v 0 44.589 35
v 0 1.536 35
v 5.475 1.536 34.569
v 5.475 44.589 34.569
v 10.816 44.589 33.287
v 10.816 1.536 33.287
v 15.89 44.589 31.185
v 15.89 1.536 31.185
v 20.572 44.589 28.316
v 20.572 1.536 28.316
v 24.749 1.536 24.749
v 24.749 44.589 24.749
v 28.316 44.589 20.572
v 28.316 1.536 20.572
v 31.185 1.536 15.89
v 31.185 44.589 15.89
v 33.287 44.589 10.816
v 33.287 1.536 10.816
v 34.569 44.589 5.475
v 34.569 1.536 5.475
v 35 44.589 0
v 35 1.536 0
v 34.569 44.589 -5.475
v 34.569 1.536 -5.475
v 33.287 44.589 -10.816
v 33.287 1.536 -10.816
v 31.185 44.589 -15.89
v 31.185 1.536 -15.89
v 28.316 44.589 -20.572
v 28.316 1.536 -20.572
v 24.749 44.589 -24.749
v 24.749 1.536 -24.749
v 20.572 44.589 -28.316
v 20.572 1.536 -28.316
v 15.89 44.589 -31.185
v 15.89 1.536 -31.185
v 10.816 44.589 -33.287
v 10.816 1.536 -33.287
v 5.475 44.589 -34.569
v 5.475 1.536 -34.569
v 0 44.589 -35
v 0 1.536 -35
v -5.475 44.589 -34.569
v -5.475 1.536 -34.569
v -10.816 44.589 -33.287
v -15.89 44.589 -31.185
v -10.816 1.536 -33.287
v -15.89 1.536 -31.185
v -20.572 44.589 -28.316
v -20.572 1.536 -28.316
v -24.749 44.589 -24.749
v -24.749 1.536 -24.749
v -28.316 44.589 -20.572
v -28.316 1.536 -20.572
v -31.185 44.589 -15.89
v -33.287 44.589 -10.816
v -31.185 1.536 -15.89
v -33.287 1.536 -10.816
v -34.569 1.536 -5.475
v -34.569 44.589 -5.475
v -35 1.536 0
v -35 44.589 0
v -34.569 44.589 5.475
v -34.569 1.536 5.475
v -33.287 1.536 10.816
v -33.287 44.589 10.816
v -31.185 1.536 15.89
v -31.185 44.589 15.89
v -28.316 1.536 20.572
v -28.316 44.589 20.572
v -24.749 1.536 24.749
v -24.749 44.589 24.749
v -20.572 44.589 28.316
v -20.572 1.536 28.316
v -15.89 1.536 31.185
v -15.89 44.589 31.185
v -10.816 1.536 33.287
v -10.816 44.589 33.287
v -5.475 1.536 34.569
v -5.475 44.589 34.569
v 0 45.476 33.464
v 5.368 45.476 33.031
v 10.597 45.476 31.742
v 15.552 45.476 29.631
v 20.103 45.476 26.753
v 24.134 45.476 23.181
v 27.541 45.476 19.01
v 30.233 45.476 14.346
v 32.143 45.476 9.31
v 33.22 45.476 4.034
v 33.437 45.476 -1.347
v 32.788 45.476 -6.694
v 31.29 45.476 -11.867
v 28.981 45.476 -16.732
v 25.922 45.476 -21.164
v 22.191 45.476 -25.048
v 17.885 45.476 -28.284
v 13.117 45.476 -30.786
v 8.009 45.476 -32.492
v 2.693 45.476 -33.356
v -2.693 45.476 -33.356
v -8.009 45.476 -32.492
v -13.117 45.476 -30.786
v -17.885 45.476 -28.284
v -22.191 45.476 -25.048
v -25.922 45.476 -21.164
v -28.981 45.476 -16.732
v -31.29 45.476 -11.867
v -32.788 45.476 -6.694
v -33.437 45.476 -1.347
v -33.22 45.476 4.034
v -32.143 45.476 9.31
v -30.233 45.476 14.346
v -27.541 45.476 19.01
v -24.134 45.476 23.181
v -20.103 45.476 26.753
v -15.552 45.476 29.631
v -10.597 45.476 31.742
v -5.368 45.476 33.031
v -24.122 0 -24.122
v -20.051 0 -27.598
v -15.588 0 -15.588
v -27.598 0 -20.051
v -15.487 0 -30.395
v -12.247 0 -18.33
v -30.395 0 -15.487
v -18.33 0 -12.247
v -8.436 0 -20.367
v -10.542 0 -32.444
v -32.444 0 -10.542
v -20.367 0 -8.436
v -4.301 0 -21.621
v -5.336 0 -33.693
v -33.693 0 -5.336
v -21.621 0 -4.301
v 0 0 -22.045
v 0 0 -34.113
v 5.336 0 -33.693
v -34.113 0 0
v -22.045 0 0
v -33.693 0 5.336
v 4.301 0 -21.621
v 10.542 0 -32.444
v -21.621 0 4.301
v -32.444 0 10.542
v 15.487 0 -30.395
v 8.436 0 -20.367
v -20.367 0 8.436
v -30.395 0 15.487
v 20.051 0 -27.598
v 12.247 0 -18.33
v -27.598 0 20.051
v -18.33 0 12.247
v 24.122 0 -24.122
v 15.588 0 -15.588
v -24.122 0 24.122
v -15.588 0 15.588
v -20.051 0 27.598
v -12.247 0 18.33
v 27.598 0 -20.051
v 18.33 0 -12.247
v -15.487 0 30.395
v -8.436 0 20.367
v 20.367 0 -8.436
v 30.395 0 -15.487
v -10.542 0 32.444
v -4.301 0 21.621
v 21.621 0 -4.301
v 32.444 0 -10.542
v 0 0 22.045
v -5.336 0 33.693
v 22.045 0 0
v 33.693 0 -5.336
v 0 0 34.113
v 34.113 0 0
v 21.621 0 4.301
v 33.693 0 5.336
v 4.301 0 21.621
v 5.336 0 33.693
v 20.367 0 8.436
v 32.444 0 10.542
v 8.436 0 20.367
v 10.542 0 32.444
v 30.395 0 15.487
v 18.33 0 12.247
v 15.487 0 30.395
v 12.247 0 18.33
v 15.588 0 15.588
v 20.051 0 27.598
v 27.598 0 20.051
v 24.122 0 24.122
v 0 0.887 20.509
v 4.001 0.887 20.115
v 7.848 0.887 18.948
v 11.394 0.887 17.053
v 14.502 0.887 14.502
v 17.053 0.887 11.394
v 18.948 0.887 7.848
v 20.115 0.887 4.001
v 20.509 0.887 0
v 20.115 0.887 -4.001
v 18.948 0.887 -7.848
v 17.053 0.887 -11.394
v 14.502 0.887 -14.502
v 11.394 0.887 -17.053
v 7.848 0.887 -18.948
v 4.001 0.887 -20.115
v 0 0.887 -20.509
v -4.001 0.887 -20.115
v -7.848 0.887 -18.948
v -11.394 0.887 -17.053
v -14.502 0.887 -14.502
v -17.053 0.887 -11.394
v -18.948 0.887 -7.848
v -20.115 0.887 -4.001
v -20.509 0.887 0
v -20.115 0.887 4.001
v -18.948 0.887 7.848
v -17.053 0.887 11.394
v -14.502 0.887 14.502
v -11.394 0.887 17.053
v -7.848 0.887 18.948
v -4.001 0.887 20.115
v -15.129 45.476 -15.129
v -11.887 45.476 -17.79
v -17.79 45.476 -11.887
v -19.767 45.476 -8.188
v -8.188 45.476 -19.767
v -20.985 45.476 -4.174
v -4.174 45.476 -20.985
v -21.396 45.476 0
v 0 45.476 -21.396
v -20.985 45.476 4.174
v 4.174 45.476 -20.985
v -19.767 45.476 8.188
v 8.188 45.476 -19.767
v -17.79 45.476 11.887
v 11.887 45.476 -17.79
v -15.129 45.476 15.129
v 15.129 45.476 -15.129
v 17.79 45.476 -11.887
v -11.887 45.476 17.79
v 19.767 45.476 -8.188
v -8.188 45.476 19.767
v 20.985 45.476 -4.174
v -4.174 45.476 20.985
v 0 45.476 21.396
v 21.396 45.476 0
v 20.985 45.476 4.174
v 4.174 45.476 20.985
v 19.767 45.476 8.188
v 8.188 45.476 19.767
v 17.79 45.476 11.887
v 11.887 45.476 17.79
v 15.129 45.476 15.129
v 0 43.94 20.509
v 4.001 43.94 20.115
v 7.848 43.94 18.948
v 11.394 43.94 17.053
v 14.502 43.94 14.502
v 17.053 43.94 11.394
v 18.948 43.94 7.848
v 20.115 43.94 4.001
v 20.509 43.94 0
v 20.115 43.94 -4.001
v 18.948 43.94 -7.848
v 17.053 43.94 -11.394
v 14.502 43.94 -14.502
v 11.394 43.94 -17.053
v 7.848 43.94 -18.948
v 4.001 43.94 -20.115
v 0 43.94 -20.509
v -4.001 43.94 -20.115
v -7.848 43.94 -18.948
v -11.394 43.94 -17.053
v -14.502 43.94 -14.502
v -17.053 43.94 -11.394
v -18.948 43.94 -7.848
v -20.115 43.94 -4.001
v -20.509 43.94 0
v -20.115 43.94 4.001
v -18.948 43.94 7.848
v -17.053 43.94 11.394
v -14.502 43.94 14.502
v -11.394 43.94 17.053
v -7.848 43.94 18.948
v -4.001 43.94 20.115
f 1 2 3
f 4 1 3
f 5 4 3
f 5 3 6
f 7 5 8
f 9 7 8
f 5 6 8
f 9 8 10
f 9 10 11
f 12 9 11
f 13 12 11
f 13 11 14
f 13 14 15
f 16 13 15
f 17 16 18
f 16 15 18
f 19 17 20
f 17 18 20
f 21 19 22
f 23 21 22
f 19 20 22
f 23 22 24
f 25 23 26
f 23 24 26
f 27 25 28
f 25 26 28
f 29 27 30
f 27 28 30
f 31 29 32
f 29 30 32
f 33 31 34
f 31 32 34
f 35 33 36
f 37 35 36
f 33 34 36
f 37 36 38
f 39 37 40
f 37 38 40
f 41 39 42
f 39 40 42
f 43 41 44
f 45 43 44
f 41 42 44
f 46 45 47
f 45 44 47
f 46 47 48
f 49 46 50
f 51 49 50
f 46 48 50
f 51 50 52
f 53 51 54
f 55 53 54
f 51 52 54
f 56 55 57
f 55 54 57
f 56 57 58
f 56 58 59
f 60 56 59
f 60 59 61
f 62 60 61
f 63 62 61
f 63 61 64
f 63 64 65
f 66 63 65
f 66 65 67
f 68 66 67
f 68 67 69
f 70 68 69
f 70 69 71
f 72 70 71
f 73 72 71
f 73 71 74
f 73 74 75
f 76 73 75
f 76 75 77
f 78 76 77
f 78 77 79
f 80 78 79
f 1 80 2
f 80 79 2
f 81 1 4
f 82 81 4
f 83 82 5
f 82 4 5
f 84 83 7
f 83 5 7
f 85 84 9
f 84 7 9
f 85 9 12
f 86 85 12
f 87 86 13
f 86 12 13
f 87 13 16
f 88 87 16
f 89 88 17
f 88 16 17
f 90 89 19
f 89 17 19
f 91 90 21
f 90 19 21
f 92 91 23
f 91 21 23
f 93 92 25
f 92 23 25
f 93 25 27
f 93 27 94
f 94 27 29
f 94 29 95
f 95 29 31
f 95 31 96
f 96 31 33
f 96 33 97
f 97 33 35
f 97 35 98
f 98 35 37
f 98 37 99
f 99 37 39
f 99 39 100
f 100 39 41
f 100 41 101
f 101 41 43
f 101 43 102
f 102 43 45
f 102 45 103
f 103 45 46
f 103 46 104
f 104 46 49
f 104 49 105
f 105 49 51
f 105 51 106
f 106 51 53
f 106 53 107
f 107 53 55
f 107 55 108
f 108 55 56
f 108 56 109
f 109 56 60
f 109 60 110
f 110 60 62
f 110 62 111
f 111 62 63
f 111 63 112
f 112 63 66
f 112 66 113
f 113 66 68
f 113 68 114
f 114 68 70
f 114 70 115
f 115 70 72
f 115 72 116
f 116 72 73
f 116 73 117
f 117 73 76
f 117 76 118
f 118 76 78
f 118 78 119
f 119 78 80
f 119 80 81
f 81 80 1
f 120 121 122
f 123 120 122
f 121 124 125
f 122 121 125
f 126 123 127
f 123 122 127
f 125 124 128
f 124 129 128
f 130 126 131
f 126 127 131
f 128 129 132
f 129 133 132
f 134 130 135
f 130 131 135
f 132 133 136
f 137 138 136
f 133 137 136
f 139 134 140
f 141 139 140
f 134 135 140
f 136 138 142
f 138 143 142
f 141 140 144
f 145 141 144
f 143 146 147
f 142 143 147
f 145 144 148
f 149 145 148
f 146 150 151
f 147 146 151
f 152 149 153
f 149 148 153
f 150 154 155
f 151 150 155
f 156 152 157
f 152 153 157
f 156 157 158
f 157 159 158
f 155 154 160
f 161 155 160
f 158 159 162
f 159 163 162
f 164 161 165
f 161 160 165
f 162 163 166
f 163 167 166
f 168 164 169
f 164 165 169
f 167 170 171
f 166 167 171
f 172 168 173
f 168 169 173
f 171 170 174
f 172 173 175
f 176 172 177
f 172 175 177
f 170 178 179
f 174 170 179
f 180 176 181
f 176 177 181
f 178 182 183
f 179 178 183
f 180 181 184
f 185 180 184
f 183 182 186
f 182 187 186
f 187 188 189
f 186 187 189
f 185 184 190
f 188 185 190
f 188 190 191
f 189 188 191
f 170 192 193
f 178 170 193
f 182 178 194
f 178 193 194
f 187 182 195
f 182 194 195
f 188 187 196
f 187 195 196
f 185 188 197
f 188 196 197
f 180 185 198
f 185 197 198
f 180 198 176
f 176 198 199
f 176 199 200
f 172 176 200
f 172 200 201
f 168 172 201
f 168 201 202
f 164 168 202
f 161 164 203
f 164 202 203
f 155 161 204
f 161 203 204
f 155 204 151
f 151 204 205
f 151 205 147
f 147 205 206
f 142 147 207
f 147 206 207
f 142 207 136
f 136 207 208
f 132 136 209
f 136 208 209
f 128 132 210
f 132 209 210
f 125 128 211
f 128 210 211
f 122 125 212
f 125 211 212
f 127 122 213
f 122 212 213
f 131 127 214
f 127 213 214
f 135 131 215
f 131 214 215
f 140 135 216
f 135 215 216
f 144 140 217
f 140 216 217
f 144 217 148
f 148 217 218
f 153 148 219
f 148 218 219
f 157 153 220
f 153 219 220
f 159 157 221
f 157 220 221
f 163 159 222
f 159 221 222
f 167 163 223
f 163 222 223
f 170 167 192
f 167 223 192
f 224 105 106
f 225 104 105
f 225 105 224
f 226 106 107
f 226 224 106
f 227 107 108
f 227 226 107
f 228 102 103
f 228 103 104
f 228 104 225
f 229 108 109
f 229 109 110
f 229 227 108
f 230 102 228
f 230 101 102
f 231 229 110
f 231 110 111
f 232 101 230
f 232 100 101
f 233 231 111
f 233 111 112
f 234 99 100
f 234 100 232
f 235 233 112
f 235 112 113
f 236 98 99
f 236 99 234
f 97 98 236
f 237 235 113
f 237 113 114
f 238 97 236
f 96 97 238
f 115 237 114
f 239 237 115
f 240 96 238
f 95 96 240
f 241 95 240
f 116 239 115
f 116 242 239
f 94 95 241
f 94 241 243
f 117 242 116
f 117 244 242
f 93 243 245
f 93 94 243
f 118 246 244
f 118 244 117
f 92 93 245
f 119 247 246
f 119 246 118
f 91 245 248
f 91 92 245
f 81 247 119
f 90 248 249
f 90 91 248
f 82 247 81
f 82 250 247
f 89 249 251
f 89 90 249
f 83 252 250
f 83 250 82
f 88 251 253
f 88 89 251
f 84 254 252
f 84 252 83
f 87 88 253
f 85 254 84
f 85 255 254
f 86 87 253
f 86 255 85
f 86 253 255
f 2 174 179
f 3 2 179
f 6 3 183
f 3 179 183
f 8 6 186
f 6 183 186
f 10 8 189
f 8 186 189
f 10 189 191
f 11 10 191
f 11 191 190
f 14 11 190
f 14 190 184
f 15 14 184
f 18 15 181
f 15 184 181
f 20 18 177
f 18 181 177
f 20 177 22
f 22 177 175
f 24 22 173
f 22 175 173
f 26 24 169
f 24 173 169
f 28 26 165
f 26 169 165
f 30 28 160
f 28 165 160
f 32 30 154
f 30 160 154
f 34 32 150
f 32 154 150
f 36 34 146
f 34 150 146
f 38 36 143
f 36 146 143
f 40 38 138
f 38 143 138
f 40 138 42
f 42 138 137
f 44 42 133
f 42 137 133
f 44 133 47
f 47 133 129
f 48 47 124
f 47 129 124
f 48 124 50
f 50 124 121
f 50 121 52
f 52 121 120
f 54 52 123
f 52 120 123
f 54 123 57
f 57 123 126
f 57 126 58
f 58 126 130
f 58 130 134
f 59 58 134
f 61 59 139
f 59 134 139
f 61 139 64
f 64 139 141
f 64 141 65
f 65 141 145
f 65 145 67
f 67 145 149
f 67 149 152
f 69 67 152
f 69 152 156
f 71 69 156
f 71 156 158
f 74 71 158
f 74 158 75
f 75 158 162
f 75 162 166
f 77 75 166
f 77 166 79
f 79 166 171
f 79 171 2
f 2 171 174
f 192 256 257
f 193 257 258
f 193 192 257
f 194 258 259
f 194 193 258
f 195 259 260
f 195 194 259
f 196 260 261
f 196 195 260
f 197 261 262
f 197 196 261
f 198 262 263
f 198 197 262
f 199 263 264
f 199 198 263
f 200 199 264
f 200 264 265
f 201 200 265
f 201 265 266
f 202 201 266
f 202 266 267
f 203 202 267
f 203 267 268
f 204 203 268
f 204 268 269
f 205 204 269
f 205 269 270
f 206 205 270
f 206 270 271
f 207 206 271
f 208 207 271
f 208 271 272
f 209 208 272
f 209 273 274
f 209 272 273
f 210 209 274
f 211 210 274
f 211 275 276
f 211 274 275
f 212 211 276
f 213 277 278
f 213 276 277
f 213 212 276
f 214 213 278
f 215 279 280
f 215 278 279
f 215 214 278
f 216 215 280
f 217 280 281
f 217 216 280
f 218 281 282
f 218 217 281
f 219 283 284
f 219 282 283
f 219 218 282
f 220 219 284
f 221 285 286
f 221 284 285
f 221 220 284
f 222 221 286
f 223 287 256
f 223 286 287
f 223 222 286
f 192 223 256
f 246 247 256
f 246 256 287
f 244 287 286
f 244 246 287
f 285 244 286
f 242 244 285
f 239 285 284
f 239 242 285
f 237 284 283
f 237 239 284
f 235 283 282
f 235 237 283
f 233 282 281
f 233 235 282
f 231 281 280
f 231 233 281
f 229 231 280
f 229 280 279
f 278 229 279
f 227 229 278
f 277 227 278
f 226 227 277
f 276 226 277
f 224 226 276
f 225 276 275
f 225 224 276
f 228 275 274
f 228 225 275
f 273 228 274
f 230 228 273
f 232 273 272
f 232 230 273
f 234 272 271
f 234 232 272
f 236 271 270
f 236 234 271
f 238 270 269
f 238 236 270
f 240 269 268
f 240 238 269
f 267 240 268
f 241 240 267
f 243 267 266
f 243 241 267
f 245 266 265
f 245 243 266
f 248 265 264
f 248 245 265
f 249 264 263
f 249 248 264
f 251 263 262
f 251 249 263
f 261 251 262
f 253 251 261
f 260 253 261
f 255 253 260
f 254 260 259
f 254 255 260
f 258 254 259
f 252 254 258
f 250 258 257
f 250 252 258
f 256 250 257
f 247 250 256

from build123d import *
from OCP.BRepFilletAPI import BRepFilletAPI_MakeChamfer

# Parameters (mm, degrees)
SKETCH1_R           = 35
BOSS_EXTRUDE1_DEPTH = 45.475969111
SKETCH2_R           = 20.508937662
CUT_EXTRUDE1_DEPTH  = 68.216543846
CHAMFER1_SIZE       = 0.886686517
CHAMFER1_SIZE2      = 1.535786098


with BuildPart() as part:
    # Sketch1 → Boss-Extrude1 (new body)
    with BuildSketch(Plane(origin=(0, 0, 0), x_dir=(1, 0, 0), z_dir=(0, 1, 0))):
        Circle(SKETCH1_R)
    extrude(amount=BOSS_EXTRUDE1_DEPTH)

    # Sketch2 → Cut-Extrude1 (cut, through all)
    with BuildSketch(Plane(origin=(0, 0, 0), x_dir=(1, 0, 0), z_dir=(0, 1, 0))):
        Circle(SKETCH2_R)
    extrude(amount=CUT_EXTRUDE1_DEPTH, mode=Mode.SUBTRACT)

    # Chamfer1: one chamfer whose edges measure the first distance from different faces: ONE call of the kernel's chamfer builder (chamfer() names one face for all edges)
    chamfer1_edges_1 = [part.edges().sort_by_distance(p)[0] for p in [
        (-20.508937662, 45.475969111, 0),
    ]]
    chamfer1_side_1 = [part.faces().sort_by_distance(p)[0] for p in [
        (-34.010050506, 45.475969111, 0),
    ]]
    chamfer1_edges_2 = [part.edges().sort_by_distance(p)[0] for p in [
        (-20.508937662, 0, 0),
    ]]
    chamfer1_side_2 = [part.faces().sort_by_distance(p)[0] for p in [
        (-20.508937662, 22.737984555, 0),
    ]]
    chamfer1_edges_3 = [part.edges().sort_by_distance(p)[0] for p in [
        (-35, 0, 0),
    ]]
    chamfer1_side_3 = [part.faces().sort_by_distance(p)[0] for p in [
        (-34.010050506, 0, 0),
    ]]
    chamfer1_edges_4 = [part.edges().sort_by_distance(p)[0] for p in [
        (-35, 45.475969111, 0),
    ]]
    chamfer1_side_4 = [part.faces().sort_by_distance(p)[0] for p in [
        (-35, 22.737984555, 0),
    ]]
    chamfer1 = BRepFilletAPI_MakeChamfer(part.part.solid().wrapped)
    for e in chamfer1_edges_1:
        chamfer1.Add(CHAMFER1_SIZE, CHAMFER1_SIZE2, e.wrapped, chamfer1_side_1[0].wrapped)  # the first distance lies on this face
    for e in chamfer1_edges_2:
        chamfer1.Add(CHAMFER1_SIZE, CHAMFER1_SIZE2, e.wrapped, chamfer1_side_2[0].wrapped)  # the first distance lies on this face
    for e in chamfer1_edges_3:
        chamfer1.Add(CHAMFER1_SIZE, CHAMFER1_SIZE2, e.wrapped, chamfer1_side_3[0].wrapped)  # the first distance lies on this face
    for e in chamfer1_edges_4:
        chamfer1.Add(CHAMFER1_SIZE, CHAMFER1_SIZE2, e.wrapped, chamfer1_side_4[0].wrapped)  # the first distance lies on this face
    add(Compound.cast(chamfer1.Shape()), mode=Mode.REPLACE)


solid = part.part
